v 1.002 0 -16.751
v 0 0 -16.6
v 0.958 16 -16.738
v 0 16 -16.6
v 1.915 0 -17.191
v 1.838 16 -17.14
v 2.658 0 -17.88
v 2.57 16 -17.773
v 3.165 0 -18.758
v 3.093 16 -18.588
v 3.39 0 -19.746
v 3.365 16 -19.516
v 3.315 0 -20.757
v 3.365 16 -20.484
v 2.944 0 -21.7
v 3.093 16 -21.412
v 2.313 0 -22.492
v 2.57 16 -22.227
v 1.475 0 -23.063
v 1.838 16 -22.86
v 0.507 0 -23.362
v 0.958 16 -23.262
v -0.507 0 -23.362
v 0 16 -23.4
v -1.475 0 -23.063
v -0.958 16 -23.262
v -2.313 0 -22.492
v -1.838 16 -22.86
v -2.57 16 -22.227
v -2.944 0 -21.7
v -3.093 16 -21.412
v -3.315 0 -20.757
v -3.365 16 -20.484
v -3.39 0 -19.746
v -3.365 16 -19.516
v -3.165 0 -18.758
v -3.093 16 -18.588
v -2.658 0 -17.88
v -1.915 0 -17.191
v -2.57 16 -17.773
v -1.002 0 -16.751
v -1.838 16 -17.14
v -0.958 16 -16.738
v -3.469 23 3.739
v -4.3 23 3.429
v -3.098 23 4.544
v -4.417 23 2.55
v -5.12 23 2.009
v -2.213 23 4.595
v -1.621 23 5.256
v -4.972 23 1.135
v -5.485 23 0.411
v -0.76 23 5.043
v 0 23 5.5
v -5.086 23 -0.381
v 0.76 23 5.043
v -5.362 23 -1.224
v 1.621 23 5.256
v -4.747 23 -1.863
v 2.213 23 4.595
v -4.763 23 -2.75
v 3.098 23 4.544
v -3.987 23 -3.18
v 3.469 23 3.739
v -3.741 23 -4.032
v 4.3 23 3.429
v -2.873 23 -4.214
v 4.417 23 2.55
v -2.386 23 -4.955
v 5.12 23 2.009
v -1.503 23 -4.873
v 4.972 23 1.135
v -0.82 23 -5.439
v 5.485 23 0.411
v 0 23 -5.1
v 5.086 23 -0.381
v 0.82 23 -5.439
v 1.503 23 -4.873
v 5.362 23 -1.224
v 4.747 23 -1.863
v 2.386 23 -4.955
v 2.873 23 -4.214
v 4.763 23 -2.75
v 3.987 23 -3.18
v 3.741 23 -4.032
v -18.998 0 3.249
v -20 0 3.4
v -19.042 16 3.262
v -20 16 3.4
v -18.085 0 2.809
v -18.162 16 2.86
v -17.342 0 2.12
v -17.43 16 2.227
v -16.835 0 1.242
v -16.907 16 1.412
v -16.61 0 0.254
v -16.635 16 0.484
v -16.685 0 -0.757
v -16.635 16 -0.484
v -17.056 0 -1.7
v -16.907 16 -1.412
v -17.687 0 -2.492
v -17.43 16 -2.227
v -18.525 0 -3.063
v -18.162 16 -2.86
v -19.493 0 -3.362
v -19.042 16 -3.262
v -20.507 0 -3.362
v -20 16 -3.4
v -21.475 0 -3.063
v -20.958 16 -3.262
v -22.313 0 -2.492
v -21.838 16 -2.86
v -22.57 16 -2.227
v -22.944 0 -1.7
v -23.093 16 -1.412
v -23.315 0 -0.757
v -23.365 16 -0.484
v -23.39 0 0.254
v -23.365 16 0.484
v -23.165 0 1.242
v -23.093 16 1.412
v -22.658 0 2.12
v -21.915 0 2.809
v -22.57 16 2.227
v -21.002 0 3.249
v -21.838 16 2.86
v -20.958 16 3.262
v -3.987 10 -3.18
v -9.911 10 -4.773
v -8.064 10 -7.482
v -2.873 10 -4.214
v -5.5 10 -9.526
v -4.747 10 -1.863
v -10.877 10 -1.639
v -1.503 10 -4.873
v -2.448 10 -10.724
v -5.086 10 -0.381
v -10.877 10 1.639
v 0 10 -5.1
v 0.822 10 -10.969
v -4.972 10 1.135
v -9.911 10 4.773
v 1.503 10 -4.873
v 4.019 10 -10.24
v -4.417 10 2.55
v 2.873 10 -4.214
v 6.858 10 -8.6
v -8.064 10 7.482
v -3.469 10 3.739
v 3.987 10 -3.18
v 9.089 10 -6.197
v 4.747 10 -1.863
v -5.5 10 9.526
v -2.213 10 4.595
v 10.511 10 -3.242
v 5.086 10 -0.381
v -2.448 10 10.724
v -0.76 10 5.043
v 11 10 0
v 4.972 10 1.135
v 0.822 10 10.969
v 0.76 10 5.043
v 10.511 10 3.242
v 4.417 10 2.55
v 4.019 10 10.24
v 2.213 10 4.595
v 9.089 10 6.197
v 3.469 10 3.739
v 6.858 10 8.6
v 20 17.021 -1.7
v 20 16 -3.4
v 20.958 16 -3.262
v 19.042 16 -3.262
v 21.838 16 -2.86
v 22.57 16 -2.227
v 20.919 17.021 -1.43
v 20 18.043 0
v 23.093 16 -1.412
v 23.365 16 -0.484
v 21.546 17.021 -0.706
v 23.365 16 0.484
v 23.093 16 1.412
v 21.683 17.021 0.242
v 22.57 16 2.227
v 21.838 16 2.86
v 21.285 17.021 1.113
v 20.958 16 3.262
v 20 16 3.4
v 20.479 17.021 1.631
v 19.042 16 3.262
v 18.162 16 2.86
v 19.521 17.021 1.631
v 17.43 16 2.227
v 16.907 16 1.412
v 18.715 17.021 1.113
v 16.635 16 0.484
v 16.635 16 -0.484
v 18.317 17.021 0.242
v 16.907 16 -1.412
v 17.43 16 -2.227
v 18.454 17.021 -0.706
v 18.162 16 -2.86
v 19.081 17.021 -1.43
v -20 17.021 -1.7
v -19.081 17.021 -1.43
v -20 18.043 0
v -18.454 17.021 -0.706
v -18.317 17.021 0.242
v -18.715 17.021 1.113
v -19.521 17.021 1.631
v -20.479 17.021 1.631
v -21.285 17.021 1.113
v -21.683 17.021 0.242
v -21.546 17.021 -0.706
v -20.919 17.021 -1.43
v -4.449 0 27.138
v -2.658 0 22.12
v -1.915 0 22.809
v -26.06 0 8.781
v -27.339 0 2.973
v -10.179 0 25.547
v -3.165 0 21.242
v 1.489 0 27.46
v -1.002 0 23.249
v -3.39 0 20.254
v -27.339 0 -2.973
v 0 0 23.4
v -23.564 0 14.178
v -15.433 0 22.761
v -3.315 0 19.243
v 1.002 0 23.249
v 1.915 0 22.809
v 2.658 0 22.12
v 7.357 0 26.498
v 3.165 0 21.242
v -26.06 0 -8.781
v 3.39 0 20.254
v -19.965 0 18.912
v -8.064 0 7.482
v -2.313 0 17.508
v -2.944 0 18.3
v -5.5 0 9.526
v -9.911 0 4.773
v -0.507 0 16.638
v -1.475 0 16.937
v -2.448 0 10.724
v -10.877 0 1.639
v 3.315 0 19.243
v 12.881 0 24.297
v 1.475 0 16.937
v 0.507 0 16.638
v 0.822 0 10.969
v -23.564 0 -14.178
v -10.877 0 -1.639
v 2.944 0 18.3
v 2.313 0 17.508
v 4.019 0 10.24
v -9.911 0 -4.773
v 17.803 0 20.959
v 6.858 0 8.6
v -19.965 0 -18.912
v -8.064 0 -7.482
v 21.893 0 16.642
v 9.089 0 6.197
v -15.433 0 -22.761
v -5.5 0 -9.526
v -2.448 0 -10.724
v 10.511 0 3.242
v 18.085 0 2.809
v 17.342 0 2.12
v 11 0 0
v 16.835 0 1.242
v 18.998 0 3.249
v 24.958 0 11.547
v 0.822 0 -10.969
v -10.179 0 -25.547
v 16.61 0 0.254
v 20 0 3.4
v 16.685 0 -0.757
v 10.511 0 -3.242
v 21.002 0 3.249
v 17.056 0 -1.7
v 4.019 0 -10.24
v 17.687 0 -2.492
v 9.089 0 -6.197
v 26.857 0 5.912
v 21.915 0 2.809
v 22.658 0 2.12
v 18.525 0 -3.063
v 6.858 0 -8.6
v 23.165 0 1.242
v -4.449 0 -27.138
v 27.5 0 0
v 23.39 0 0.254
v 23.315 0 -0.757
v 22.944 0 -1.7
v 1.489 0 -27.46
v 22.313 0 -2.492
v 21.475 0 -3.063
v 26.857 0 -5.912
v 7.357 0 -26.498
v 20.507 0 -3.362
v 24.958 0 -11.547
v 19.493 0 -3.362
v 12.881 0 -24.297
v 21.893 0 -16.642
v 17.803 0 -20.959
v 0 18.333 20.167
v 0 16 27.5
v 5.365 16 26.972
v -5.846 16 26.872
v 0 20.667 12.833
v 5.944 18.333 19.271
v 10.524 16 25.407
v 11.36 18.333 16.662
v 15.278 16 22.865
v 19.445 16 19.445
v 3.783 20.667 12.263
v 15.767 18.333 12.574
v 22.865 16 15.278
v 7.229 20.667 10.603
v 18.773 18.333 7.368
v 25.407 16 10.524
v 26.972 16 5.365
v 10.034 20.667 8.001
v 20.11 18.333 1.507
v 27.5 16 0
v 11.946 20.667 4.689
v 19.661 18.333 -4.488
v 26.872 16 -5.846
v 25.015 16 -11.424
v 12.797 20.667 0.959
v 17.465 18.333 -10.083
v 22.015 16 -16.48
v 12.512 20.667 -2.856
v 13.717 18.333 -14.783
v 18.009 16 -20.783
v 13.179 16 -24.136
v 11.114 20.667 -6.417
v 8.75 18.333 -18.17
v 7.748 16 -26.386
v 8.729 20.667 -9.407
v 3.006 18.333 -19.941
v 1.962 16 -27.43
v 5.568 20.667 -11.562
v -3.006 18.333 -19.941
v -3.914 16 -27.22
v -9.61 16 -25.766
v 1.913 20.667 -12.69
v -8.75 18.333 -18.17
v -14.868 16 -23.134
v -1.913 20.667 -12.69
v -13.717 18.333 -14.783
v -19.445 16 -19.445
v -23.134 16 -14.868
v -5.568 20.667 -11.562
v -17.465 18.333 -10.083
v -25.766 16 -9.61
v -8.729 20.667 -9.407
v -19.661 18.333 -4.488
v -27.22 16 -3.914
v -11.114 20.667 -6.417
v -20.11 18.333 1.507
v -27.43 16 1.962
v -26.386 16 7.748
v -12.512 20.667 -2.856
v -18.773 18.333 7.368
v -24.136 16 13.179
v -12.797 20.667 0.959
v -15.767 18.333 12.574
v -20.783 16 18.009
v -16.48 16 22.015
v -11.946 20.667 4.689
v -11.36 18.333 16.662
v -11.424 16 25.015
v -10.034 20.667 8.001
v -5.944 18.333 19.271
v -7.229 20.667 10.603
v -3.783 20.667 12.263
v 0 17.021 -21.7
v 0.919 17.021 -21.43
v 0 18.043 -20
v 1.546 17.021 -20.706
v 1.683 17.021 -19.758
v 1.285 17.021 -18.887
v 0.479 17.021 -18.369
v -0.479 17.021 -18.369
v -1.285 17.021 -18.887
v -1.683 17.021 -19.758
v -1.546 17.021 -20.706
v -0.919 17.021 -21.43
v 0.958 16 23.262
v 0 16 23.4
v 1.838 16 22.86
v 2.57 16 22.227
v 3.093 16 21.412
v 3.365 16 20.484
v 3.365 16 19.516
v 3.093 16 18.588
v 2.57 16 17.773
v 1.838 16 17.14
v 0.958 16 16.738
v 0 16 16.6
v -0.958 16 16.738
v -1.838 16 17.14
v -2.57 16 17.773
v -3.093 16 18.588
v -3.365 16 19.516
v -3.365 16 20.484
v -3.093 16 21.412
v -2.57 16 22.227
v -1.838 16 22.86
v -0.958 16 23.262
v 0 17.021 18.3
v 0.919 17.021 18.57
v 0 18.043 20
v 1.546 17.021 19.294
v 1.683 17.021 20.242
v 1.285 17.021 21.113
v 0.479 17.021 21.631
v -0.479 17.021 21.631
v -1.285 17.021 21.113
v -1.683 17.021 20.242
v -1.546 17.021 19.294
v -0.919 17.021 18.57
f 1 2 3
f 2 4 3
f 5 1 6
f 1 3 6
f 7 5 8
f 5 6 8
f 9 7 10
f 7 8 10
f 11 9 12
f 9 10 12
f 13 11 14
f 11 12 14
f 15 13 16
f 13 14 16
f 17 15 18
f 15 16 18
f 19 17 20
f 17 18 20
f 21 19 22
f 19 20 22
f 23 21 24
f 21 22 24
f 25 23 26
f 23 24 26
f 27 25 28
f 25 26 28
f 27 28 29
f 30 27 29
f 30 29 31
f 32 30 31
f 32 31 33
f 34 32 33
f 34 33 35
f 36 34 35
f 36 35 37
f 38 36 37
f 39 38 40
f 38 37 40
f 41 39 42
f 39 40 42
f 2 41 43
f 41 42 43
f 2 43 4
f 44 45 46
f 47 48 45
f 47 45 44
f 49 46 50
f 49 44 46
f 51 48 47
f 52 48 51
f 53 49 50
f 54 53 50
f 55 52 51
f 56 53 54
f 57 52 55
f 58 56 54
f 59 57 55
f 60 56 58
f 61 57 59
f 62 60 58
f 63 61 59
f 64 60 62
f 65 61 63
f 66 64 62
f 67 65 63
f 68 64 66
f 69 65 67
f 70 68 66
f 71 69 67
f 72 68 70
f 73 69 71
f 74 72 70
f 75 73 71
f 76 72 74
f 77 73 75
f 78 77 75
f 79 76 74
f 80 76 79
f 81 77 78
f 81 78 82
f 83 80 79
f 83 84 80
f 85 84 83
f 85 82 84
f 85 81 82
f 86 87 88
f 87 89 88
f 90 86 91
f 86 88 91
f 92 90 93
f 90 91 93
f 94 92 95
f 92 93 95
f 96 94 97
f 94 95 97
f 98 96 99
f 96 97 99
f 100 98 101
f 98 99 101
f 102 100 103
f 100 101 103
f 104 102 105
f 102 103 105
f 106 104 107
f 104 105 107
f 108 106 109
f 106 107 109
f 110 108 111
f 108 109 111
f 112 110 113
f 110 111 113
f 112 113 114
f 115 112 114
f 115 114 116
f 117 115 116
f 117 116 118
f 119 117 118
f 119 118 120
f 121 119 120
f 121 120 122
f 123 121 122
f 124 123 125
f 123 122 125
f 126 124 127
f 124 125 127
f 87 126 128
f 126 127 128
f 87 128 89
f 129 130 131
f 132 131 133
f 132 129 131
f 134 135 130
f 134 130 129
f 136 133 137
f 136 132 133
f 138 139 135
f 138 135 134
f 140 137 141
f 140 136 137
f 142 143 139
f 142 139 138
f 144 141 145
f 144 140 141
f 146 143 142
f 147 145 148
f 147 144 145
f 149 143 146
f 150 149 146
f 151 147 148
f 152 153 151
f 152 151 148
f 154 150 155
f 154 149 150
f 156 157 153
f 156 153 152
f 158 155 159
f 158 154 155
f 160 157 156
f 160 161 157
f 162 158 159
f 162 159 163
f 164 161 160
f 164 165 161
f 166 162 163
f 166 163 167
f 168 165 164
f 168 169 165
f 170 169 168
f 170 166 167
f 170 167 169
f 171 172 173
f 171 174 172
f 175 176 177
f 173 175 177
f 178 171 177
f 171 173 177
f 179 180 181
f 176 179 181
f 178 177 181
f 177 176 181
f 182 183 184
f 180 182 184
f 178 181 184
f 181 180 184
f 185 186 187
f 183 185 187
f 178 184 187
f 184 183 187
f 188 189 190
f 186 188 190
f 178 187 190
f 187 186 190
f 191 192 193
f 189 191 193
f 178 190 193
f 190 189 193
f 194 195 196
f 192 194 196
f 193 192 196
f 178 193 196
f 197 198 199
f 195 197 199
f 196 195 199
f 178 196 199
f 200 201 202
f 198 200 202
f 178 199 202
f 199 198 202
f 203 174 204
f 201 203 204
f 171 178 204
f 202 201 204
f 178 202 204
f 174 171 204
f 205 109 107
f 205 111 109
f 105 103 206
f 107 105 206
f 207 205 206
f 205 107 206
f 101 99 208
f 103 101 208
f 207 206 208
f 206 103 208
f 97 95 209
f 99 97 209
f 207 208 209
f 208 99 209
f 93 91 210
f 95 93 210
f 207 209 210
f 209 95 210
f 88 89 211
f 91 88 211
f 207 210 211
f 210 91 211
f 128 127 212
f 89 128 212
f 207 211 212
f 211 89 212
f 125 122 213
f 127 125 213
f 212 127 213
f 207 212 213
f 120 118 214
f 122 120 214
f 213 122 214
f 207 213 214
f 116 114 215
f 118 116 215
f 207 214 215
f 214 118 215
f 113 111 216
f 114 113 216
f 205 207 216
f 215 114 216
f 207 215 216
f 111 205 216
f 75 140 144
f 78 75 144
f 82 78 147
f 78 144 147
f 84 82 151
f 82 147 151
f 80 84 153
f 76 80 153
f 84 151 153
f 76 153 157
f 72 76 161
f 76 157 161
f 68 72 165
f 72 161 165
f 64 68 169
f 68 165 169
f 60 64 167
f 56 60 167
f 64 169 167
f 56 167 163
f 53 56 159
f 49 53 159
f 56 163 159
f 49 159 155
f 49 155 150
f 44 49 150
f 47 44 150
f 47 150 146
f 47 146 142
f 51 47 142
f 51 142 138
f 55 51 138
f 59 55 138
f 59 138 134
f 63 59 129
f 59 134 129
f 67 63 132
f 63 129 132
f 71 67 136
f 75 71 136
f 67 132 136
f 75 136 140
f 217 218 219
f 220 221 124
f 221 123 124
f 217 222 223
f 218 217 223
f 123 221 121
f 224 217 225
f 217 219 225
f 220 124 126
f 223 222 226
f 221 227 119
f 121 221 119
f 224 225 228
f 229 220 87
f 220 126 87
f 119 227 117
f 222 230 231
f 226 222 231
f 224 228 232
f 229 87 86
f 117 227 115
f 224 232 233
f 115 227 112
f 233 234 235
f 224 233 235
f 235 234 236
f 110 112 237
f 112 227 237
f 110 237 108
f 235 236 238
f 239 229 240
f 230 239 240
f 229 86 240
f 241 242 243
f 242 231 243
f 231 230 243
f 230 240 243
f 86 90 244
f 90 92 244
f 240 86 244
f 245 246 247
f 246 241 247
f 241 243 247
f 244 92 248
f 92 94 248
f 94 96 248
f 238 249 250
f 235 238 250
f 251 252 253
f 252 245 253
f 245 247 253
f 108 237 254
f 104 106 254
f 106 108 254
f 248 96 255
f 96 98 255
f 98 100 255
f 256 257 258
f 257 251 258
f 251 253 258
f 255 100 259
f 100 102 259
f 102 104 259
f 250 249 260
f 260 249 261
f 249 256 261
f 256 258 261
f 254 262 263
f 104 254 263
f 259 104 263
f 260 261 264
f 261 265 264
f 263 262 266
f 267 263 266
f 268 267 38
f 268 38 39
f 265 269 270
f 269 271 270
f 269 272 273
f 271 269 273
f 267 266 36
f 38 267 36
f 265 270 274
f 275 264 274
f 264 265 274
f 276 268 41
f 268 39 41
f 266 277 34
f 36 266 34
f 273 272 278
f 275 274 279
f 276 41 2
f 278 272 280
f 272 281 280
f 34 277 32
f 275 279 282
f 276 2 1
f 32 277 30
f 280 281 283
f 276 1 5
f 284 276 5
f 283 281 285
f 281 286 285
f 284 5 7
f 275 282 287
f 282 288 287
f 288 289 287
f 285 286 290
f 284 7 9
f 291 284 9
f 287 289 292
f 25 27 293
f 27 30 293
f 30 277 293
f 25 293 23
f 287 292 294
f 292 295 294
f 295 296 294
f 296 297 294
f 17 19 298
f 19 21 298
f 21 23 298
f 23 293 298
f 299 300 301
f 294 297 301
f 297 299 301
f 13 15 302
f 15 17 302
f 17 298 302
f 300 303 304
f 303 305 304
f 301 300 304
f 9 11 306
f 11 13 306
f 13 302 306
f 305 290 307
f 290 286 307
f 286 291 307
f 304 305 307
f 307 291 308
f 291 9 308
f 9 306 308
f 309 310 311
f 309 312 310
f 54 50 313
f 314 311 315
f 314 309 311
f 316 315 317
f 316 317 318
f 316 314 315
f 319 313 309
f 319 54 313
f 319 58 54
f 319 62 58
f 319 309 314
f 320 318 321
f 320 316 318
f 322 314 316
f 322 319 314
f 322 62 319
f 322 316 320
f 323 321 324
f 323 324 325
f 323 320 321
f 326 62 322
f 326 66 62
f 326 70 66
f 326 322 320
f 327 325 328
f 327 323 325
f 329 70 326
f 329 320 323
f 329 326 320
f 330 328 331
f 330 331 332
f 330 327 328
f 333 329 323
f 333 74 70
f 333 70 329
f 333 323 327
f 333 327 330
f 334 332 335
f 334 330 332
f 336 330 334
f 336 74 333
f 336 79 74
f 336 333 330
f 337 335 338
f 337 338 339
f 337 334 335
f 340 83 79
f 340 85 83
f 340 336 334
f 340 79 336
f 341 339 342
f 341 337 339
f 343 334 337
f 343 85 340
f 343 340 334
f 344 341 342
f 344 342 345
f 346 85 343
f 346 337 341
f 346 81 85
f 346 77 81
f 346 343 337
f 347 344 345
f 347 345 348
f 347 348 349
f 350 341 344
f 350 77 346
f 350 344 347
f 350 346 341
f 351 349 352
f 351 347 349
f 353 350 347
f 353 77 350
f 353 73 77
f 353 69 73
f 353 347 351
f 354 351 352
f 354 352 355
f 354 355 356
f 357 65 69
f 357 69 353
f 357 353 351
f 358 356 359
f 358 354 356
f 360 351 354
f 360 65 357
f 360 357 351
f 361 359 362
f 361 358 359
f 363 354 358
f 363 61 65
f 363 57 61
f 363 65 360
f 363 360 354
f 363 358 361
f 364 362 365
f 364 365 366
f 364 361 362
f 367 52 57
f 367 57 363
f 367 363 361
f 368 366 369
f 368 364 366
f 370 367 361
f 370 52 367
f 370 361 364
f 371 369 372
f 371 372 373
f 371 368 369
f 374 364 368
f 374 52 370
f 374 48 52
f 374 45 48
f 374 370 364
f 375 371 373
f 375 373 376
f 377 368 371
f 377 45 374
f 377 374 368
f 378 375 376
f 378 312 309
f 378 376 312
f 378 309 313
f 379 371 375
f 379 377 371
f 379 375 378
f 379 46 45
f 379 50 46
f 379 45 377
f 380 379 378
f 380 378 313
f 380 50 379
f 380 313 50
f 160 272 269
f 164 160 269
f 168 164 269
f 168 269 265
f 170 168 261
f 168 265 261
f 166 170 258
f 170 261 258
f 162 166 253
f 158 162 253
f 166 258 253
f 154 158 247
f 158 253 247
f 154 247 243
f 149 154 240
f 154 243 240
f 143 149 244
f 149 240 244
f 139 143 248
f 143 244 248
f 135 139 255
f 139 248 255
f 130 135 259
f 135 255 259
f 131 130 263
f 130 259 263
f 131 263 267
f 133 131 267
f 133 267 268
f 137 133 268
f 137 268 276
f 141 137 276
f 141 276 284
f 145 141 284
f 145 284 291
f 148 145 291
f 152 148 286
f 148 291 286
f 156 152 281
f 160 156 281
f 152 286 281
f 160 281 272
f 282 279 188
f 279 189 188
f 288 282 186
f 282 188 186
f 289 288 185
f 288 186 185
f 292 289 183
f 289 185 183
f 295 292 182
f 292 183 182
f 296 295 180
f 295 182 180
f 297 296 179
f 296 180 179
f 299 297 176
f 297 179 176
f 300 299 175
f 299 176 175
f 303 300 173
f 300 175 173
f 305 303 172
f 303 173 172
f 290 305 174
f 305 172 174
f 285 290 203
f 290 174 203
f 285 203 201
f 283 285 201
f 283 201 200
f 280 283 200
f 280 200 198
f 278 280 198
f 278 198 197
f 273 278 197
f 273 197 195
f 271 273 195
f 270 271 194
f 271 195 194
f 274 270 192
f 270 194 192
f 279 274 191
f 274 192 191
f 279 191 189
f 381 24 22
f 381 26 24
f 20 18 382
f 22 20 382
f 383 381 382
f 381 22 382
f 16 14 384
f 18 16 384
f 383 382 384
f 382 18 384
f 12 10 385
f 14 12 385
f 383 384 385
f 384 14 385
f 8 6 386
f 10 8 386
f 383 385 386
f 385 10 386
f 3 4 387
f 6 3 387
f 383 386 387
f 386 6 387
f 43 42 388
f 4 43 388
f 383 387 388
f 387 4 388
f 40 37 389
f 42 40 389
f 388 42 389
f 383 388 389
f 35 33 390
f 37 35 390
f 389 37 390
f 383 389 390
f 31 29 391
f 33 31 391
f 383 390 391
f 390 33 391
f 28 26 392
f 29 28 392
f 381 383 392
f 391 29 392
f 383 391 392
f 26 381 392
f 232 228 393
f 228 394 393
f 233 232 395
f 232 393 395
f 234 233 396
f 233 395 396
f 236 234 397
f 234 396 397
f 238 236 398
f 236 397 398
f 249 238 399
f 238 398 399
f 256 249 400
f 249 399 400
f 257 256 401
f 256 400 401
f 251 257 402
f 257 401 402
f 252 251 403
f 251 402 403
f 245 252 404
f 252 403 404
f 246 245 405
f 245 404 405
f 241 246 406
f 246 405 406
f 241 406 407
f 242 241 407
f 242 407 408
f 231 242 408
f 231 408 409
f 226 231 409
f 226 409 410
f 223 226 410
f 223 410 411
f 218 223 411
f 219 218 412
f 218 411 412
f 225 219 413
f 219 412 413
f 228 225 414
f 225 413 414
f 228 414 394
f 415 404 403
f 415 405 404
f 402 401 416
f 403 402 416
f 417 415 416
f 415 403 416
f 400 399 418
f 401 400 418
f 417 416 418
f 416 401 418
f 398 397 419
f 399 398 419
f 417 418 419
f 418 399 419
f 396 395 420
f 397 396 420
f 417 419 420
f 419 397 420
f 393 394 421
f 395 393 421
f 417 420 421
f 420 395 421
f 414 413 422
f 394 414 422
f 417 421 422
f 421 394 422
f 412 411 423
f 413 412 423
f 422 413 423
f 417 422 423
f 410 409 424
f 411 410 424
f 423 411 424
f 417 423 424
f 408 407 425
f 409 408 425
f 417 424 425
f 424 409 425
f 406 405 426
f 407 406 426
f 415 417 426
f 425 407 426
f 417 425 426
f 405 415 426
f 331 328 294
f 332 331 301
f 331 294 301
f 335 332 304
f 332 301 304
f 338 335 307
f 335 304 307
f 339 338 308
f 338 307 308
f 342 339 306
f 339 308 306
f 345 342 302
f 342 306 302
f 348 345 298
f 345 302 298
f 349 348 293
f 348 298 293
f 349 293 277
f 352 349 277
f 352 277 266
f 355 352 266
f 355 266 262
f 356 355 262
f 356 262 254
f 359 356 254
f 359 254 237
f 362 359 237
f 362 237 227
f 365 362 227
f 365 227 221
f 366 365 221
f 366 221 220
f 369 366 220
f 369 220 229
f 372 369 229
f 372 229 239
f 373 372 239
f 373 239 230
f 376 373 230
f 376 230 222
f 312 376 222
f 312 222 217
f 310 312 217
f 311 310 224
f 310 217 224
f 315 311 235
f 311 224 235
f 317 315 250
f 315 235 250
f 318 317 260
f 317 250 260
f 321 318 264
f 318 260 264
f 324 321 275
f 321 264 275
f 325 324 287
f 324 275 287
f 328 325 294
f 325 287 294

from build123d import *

# Parameters (mm, degrees)
SKETCH1_R                   = 27.5
BOSS_EXTRUDE1_DEPTH         = 23
M12X1_75_TAPPED_HOLE1_D     = 10.2
M12X1_75_TAPPED_HOLE1_DEPTH = 21
M12X1_75_TAPPED_HOLE1_TIP   = 3.064389157
SKETCH9_R                   = 11
CUT_EXTRUDE1_DEPTH          = 10
M8X1_25_TAPPED_HOLE1_D      = 6.8
M8X1_25_TAPPED_HOLE1_DEPTH  = 16
M8X1_25_TAPPED_HOLE1_TIP    = 2.042926105


with BuildPart() as part:
    # Sketch1 → Boss-Extrude1 (new body)
    with BuildSketch(Plane(origin=(0, 0, 0), x_dir=(1, 0, 0), z_dir=(0, 1, 0))):
        Circle(SKETCH1_R)
    extrude(amount=BOSS_EXTRUDE1_DEPTH)

    # Sketch3 → Cut-Revolve1 (revolve, cut)
    with BuildSketch(Plane(origin=(0, 0, 0), x_dir=(0, 0, -1), z_dir=(1, 0, 0))):
        Polygon((-27.5, 16), (-5.5, 23), (-27.5, 23), align=None)
    revolve(axis=Axis((0, 0, 0), (0, 1, 0)), mode=Mode.SUBTRACT)

    # M12x1.75 Tapped Hole1
    with Locations(Plane.ZX.offset(23)):
        with Locations((0, 0)):
            Hole(M12X1_75_TAPPED_HOLE1_D / 2, depth=M12X1_75_TAPPED_HOLE1_DEPTH)
            with Locations((0, 0, -(M12X1_75_TAPPED_HOLE1_DEPTH + M12X1_75_TAPPED_HOLE1_TIP / 2))):  # 118° drill point
                Cone(0, M12X1_75_TAPPED_HOLE1_D / 2, M12X1_75_TAPPED_HOLE1_TIP, mode=Mode.SUBTRACT)

    # Sketch9 → Cut-Extrude1 (cut)
    with BuildSketch(Plane.XZ):
        Circle(SKETCH9_R)
    extrude(amount=-CUT_EXTRUDE1_DEPTH, mode=Mode.SUBTRACT)

    # M8x1.25 Tapped Hole1
    with Locations(Plane(origin=(0, 0, 20), x_dir=(0, 0, -1), z_dir=(0, -1, 0))):
        with Locations((0, 0), (20, 20), (40, 0), (20, -20)):
            Hole(M8X1_25_TAPPED_HOLE1_D / 2, depth=M8X1_25_TAPPED_HOLE1_DEPTH)
            with Locations((0, 0, -(M8X1_25_TAPPED_HOLE1_DEPTH + M8X1_25_TAPPED_HOLE1_TIP / 2))):  # 118° drill point
                Cone(0, M8X1_25_TAPPED_HOLE1_D / 2, M8X1_25_TAPPED_HOLE1_TIP, mode=Mode.SUBTRACT)


solid = part.part
